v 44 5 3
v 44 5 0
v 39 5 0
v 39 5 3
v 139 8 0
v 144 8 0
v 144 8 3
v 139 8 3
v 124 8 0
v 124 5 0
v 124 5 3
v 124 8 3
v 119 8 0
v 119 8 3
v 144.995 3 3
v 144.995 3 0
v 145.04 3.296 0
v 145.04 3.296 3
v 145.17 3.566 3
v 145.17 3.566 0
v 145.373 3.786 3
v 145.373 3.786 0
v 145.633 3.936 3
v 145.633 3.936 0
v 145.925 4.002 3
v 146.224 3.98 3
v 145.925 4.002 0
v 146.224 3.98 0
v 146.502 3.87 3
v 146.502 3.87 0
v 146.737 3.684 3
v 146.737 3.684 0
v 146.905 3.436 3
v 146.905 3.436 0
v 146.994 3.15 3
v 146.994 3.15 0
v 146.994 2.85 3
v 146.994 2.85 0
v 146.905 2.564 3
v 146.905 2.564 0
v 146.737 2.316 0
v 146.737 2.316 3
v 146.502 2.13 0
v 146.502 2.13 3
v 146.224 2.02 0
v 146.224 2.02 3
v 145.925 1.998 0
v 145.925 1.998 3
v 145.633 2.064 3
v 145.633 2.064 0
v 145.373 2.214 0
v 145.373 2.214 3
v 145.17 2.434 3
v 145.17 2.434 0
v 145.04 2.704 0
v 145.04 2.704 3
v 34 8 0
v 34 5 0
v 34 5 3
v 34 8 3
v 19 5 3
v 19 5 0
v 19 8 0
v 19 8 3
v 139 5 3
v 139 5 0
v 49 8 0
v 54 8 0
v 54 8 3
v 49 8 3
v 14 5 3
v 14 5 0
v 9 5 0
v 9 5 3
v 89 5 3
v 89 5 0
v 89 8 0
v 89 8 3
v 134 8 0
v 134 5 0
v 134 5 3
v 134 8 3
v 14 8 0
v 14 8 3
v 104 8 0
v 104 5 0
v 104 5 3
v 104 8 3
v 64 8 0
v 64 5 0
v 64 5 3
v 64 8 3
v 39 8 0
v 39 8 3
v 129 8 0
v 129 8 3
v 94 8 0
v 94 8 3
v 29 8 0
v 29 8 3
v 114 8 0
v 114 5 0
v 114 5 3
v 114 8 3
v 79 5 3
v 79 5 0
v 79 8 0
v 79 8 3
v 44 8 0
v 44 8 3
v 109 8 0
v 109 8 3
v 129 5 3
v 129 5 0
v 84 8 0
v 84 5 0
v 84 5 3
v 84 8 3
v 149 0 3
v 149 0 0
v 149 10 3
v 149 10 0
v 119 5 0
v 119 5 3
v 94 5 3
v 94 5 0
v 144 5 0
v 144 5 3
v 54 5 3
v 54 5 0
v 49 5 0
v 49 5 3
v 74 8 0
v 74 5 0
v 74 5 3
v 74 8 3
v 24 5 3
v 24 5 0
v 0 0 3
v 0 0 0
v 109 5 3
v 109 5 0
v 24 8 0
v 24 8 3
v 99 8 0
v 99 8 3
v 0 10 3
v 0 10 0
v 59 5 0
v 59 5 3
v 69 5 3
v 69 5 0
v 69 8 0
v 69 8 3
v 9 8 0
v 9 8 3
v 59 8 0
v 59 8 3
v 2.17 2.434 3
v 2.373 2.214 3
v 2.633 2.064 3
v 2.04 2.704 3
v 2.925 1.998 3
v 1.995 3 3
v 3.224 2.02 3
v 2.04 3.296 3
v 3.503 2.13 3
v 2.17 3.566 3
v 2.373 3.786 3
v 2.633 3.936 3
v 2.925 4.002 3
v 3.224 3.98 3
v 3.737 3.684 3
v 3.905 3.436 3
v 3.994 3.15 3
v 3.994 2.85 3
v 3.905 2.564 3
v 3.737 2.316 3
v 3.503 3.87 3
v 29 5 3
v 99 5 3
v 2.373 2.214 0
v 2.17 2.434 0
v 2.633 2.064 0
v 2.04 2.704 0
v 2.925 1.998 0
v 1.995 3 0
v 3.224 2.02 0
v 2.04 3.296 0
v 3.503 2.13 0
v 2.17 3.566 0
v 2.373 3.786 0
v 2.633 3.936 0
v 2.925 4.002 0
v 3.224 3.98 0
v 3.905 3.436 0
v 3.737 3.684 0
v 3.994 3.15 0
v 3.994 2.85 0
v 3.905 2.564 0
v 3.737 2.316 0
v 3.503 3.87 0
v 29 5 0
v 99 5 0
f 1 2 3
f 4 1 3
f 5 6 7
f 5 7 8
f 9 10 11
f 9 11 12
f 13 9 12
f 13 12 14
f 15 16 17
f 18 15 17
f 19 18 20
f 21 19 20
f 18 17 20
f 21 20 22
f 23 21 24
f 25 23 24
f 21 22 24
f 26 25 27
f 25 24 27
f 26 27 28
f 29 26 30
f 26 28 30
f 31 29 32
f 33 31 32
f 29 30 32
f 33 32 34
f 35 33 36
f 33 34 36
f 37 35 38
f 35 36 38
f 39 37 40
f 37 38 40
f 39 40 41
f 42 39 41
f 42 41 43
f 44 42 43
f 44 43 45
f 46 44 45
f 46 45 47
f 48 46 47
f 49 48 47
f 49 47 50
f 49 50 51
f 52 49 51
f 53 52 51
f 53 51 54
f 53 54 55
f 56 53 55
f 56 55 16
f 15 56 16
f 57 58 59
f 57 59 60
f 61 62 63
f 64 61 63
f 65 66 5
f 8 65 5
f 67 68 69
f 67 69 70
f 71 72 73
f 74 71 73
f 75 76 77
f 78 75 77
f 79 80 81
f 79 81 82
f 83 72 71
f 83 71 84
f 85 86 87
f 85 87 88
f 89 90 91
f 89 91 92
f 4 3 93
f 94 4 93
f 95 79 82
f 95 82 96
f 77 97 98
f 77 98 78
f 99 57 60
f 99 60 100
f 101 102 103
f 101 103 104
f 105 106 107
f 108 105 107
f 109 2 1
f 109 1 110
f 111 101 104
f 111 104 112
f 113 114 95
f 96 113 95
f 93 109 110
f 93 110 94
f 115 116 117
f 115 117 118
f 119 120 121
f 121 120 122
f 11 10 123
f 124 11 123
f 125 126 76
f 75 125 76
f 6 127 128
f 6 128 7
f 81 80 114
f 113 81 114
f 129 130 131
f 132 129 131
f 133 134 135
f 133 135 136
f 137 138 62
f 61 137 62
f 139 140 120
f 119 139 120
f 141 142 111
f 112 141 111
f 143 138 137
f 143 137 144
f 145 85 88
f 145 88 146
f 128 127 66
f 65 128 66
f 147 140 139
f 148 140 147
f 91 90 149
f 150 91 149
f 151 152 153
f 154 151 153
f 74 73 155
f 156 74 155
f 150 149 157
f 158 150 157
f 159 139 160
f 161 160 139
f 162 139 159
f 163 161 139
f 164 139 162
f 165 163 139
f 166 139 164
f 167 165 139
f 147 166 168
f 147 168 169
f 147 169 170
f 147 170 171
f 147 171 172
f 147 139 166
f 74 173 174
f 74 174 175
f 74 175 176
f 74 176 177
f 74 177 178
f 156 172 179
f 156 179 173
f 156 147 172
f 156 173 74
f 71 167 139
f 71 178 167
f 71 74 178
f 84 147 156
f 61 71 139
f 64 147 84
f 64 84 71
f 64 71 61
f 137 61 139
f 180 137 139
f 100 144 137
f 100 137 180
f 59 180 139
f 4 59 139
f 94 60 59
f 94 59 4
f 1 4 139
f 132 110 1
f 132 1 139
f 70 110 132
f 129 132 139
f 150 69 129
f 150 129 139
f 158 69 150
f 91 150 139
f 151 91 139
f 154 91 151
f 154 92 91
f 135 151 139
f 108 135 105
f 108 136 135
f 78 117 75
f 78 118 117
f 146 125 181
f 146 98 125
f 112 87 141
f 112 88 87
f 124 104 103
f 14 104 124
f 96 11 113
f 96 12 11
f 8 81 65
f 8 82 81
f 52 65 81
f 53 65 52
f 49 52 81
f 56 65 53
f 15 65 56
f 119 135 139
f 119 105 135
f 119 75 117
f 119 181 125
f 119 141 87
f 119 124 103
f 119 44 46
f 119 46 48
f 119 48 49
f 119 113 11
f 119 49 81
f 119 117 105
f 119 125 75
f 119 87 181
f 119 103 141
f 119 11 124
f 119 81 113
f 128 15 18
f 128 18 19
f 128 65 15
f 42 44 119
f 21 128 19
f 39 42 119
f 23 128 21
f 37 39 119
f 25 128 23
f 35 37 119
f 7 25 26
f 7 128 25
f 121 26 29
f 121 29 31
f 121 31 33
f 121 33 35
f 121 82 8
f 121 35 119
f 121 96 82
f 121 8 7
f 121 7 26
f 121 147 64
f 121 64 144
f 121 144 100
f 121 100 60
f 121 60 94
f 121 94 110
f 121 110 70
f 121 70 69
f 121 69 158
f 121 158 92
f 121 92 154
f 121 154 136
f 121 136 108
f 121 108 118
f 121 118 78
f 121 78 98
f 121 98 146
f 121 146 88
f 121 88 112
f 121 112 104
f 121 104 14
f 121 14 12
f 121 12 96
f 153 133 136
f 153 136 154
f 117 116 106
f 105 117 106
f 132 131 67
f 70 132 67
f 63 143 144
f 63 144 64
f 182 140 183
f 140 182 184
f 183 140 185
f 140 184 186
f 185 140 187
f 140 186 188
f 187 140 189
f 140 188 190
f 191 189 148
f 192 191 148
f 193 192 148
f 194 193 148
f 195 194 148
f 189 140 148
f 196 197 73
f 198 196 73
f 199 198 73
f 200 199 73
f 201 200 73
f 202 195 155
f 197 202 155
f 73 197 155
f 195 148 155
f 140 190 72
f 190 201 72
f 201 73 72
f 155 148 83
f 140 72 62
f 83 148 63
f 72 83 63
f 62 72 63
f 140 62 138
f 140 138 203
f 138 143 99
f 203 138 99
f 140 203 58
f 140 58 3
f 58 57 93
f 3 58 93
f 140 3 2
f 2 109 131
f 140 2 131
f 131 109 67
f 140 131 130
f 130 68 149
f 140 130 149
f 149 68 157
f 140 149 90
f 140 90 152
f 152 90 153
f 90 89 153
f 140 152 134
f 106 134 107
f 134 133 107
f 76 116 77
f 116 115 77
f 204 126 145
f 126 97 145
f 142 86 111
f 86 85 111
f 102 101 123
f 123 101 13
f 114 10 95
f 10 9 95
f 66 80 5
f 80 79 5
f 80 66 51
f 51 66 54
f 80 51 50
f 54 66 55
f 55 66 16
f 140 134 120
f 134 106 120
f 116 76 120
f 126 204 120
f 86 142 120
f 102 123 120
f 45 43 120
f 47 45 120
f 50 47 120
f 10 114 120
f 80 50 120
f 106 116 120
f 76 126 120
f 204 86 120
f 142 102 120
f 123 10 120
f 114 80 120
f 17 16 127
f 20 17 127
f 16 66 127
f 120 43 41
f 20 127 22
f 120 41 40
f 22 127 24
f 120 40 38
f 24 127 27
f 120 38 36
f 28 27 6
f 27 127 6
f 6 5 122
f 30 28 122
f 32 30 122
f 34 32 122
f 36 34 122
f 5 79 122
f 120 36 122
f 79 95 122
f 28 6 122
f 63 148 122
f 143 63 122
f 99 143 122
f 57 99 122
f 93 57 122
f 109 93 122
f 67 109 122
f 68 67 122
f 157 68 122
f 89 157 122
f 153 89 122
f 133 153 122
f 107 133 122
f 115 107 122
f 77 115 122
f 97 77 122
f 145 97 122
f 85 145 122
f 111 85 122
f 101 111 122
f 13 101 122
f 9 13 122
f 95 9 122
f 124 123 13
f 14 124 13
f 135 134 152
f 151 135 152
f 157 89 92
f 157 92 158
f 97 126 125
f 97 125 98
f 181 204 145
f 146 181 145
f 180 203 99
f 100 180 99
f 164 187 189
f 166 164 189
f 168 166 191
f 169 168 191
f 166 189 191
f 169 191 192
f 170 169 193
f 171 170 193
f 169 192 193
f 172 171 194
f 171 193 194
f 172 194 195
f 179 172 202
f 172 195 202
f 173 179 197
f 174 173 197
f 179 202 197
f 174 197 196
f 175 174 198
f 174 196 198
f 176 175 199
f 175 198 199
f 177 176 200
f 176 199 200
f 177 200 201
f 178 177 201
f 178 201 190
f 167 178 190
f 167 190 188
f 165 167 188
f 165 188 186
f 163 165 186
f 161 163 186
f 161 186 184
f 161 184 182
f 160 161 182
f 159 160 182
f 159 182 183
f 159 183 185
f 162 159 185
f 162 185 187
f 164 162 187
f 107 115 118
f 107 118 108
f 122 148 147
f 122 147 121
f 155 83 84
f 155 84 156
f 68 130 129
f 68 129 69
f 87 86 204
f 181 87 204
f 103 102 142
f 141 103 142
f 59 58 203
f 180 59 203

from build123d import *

# Parameters (mm, degrees)
ESQUISSE1_W             = 149
ESQUISSE1_H             = 10
BOSS_EXTRU_1_DEPTH      = 3
ESQUISSE2_R             = 1.005
ESQUISSE2_W             = 5
ESQUISSE2_H             = 3
ENL_V_MAT_EXTRU_1_DEPTH = 150.365323954


with BuildPart() as part:
    # Esquisse1 → Boss.-Extru.1 (new body)
    with BuildSketch(Plane.XY):
        with Locations((74.5, 5)):
            Rectangle(ESQUISSE1_W, ESQUISSE1_H)
    extrude(amount=BOSS_EXTRU_1_DEPTH)

    # Esquisse2 → Enlèv. mat.-Extru.1 (cut, through all)
    with BuildSketch(Plane(origin=(0, 0, 0), x_dir=(-1, 0, 0), z_dir=(0, 0, -1))):
        with Locations((-3, 3)):
            Circle(ESQUISSE2_R)
        with Locations((-146, 3)):
            Circle(ESQUISSE2_R)
        with Locations((-141.5, 6.5)):
            Rectangle(ESQUISSE2_W, ESQUISSE2_H)
        with Locations((-131.5, 6.5)):
            Rectangle(ESQUISSE2_W, ESQUISSE2_H)
        with Locations((-121.5, 6.5)):
            Rectangle(ESQUISSE2_W, ESQUISSE2_H)
        with Locations((-111.5, 6.5)):
            Rectangle(ESQUISSE2_W, ESQUISSE2_H)
        with Locations((-101.5, 6.5)):
            Rectangle(ESQUISSE2_W, ESQUISSE2_H)
        with Locations((-91.5, 6.5)):
            Rectangle(ESQUISSE2_W, ESQUISSE2_H)
        with Locations((-81.5, 6.5)):
            Rectangle(ESQUISSE2_W, ESQUISSE2_H)
        with Locations((-71.5, 6.5)):
            Rectangle(ESQUISSE2_W, ESQUISSE2_H)
        with Locations((-61.5, 6.5)):
            Rectangle(ESQUISSE2_W, ESQUISSE2_H)
        with Locations((-51.5, 6.5)):
            Rectangle(ESQUISSE2_W, ESQUISSE2_H)
        with Locations((-41.5, 6.5)):
            Rectangle(ESQUISSE2_W, ESQUISSE2_H)
        with Locations((-31.5, 6.5)):
            Rectangle(ESQUISSE2_W, ESQUISSE2_H)
        with Locations((-21.5, 6.5)):
            Rectangle(ESQUISSE2_W, ESQUISSE2_H)
        with Locations((-11.5, 6.5)):
            Rectangle(ESQUISSE2_W, ESQUISSE2_H)
    extrude(amount=-ENL_V_MAT_EXTRU_1_DEPTH, mode=Mode.SUBTRACT)


solid = part.part
